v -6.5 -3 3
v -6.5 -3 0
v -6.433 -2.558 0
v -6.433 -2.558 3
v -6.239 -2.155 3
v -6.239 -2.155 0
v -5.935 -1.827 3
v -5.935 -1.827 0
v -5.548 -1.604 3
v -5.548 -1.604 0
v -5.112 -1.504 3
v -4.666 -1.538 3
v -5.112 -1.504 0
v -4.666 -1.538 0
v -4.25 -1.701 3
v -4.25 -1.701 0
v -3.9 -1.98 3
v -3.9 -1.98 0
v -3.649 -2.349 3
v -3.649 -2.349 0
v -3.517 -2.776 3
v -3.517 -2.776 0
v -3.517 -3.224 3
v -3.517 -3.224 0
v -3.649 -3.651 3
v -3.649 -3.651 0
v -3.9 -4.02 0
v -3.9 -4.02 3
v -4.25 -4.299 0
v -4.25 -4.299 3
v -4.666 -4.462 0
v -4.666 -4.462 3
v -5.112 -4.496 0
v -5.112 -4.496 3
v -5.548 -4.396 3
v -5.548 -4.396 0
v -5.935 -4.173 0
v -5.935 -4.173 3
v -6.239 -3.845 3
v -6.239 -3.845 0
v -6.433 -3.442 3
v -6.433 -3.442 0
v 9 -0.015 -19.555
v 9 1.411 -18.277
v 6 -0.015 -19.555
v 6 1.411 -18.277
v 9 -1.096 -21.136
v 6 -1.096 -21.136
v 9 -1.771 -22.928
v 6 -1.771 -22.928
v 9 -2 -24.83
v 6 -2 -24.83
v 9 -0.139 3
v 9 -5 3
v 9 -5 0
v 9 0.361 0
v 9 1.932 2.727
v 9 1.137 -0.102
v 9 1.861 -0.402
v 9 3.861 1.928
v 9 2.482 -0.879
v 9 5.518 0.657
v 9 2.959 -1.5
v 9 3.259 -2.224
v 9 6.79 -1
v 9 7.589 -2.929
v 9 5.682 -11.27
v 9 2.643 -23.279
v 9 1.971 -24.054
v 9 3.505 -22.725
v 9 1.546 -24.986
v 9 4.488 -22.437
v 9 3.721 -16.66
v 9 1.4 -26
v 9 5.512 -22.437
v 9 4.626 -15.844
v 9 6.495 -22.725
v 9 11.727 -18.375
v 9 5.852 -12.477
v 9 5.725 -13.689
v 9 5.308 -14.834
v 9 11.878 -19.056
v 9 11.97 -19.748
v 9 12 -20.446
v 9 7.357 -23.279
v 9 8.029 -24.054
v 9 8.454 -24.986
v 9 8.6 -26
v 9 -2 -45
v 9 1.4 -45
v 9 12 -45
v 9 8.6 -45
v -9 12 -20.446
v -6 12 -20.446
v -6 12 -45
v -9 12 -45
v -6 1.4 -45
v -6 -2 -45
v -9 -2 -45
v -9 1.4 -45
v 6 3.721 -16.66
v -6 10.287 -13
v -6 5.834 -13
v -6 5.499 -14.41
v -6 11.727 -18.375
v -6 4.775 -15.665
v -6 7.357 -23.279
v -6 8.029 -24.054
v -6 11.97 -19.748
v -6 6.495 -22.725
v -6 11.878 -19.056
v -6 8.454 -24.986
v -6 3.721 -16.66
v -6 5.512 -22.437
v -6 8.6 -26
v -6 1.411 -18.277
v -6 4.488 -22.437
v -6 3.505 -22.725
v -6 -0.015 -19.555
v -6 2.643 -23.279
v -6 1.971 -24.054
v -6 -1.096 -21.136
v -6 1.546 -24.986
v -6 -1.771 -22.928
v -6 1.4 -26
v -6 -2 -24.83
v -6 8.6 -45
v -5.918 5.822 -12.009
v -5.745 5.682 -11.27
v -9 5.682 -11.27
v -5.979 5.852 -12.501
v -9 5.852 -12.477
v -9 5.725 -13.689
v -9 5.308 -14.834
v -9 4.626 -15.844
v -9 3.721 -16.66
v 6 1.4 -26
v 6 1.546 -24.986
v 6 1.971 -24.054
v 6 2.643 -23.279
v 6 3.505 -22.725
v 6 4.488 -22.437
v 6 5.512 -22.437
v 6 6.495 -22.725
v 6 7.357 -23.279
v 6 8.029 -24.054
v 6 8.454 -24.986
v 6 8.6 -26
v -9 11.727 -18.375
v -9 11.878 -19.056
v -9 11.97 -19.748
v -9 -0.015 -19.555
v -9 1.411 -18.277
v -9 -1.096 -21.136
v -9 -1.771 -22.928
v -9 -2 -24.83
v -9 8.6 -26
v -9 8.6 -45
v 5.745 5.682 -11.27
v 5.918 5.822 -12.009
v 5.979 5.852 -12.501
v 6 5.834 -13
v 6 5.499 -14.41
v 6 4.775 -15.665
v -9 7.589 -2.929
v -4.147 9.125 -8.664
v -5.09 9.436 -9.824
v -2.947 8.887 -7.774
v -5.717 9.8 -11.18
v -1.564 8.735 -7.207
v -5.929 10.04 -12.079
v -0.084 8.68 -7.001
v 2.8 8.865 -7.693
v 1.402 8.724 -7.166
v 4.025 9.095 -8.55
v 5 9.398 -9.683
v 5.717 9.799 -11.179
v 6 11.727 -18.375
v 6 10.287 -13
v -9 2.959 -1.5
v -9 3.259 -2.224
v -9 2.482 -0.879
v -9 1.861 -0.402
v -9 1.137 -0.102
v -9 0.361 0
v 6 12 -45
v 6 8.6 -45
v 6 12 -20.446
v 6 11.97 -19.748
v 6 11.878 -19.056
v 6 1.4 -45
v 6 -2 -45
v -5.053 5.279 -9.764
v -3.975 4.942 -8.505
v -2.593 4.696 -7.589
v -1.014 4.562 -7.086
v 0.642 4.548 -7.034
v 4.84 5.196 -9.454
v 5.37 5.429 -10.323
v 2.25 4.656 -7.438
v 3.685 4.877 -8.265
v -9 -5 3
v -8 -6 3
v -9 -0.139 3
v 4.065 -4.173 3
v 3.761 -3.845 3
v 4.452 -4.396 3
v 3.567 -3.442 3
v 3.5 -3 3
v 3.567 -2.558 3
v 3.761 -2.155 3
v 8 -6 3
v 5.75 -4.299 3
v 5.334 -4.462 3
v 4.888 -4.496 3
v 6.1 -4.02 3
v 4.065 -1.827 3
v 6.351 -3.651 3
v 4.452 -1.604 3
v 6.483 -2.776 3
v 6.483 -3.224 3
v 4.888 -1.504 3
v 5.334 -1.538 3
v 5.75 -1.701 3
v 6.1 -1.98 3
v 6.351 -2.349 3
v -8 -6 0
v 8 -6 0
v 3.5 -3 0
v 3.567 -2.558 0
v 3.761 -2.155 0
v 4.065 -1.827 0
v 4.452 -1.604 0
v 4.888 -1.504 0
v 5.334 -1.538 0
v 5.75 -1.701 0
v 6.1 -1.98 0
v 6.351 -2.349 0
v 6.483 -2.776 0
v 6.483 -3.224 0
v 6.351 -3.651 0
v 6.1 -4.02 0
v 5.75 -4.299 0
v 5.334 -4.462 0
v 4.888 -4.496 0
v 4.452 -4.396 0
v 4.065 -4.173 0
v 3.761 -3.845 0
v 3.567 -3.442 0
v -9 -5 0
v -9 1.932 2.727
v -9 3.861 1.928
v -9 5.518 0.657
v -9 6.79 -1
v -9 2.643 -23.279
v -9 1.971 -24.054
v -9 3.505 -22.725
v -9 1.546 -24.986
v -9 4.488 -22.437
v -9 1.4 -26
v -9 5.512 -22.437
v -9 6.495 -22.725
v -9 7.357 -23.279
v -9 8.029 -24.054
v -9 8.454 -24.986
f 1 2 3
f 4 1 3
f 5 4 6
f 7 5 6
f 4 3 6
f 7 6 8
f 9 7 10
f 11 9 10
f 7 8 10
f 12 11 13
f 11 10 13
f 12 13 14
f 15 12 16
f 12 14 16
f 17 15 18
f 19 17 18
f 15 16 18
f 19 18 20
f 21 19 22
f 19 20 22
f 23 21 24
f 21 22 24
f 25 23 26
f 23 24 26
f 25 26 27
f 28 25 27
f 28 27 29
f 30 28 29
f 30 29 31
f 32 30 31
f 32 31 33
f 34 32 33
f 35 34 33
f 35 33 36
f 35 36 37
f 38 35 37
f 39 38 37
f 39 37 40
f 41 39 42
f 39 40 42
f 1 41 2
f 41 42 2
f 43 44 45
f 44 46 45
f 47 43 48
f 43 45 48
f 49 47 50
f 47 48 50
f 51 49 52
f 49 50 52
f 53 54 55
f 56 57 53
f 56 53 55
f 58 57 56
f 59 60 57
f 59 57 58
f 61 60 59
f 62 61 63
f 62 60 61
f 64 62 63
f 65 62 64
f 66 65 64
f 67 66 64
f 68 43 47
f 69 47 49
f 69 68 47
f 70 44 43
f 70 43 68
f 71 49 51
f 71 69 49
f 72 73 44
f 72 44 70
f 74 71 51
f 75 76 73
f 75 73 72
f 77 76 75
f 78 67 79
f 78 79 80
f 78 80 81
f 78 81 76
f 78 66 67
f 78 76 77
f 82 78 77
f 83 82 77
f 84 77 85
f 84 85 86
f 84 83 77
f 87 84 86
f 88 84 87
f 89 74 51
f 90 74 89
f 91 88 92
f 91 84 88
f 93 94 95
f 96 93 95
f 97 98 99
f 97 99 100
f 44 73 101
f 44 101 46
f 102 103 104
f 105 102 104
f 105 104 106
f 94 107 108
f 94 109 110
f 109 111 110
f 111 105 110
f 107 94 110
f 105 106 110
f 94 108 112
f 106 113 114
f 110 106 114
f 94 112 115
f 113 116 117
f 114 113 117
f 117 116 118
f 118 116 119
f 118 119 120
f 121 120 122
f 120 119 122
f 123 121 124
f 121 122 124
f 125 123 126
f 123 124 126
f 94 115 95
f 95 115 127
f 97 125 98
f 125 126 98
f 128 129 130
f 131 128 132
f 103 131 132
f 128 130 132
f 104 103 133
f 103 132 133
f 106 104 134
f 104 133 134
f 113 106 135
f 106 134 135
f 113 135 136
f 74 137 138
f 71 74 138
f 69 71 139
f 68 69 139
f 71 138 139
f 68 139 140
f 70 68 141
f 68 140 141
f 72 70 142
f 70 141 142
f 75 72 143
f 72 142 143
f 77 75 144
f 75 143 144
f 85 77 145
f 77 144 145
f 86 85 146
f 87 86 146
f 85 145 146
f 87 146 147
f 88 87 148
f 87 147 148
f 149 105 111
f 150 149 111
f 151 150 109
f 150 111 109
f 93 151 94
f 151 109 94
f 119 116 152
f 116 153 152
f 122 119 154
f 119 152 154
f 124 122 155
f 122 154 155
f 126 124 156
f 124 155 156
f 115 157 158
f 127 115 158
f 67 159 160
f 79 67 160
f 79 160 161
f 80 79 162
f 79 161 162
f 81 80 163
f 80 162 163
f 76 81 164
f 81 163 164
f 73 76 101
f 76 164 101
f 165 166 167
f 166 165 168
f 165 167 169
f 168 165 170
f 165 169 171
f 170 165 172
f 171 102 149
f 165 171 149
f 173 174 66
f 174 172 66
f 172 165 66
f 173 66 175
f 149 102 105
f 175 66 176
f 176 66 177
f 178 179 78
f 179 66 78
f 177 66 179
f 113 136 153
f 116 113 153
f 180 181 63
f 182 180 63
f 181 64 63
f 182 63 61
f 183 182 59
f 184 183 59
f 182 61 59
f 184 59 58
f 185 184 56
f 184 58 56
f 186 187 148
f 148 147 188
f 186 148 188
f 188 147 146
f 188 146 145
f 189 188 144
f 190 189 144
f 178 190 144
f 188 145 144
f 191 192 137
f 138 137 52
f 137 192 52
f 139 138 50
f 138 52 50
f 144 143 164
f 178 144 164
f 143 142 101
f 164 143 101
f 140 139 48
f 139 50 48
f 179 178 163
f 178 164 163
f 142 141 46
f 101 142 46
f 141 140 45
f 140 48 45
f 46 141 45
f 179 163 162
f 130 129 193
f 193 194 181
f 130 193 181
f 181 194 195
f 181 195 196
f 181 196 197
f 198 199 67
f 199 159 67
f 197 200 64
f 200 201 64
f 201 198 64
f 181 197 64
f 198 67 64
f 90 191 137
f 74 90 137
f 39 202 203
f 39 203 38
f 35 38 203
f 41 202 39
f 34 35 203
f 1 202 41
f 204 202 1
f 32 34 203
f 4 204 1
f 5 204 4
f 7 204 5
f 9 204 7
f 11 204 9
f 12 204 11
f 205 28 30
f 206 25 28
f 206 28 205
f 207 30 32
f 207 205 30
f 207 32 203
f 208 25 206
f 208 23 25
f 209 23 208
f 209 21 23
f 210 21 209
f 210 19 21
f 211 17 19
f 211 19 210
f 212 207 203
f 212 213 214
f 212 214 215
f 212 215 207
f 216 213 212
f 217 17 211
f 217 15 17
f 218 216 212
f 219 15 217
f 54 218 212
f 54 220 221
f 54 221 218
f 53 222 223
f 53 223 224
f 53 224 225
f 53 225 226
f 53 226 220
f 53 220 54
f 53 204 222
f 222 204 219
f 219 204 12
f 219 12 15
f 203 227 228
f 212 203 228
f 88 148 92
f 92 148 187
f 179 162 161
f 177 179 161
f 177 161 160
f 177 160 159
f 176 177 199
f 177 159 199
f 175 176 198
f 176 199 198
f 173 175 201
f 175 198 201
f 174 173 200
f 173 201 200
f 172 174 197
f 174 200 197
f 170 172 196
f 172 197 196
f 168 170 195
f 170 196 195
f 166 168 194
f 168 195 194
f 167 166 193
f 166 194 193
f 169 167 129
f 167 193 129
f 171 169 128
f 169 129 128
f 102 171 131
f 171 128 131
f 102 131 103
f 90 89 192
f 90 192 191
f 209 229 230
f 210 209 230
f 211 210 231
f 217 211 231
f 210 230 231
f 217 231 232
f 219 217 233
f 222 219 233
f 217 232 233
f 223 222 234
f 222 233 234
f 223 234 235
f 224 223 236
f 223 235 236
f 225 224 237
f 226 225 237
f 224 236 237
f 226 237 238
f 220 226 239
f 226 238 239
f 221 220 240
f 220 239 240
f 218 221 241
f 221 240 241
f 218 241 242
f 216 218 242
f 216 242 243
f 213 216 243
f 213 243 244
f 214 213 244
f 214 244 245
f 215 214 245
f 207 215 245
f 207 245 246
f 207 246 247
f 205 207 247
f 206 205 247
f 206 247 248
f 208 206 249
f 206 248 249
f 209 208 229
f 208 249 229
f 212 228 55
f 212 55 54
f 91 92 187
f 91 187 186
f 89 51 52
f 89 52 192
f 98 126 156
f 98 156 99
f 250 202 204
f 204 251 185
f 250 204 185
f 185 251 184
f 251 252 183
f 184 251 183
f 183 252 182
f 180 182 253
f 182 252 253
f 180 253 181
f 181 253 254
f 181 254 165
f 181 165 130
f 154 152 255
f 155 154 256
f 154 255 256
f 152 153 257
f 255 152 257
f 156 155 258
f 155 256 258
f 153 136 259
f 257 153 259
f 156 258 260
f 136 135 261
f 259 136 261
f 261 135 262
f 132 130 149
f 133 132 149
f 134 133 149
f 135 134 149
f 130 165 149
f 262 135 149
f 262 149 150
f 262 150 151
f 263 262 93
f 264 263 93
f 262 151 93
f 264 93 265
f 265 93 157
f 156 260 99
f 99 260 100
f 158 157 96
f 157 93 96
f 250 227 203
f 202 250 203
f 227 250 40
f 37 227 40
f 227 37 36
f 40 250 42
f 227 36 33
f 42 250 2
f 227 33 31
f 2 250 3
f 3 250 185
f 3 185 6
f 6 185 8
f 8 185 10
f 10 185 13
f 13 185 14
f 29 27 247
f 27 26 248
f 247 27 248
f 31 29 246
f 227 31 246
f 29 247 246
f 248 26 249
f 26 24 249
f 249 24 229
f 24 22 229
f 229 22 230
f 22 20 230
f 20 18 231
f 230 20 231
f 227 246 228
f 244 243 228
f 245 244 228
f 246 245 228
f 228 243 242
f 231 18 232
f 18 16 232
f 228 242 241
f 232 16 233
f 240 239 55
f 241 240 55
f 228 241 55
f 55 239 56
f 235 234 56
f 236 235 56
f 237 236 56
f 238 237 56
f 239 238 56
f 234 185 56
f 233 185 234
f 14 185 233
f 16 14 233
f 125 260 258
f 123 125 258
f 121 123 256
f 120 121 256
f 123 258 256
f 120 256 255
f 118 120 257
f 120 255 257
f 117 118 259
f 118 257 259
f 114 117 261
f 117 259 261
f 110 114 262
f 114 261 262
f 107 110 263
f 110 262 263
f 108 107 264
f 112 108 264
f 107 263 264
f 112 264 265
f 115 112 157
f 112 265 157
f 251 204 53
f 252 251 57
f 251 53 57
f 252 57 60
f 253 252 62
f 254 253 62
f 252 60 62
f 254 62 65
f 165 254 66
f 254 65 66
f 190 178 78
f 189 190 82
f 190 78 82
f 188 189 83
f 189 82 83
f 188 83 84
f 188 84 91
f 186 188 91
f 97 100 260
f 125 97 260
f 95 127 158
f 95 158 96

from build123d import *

# Parameters (mm, degrees)
SKETCH_1_W          = 18
SKETCH_1_H          = 12
EXTRUDE_1_DEPTH     = 3
EXTRUDE_2_DEPTH     = 9
EXTRUDE1_DEPTH      = 18
SKETCH_5_R          = 1.5
CUT_EXTRUDE_5_DEPTH = 3
CHAMFER_1_SIZE      = 1
FILLET1_R           = 8
EXTRUDE6_REACH      = 51.295
EXTRUDE7_START      = -18
EXTRUDE7_DEPTH      = 18
FILLET5_R           = 3
FILLET6_R           = 5
FILLET7_R           = 8


with BuildPart() as part:
    # 草图1 → 拉伸1 (new body)
    with BuildSketch(Plane.XY):
        Rectangle(SKETCH_1_W, SKETCH_1_H)
    extrude(amount=EXTRUDE_1_DEPTH)

    # 草图2 → 拉伸2 (add, symmetric)
    with BuildSketch(Plane(origin=(0, 0, 0), x_dir=(0, 0, -1), z_dir=(1, 0, 0))):
        Polygon((19.392304845, 12), (45, 12), (45, 8.2), (20.665324997, 8.2), (0, 2.662742856), (-3, 6), align=None)
    extrude(amount=EXTRUDE_2_DEPTH, both=True)

    # Sketch2 → Extrude1 (add)
    with BuildSketch(Plane(origin=(9, 0, 0), x_dir=(0, 0, -1), z_dir=(1, 0, 0))):
        Polygon((45, 8.2), (20.665324997, 8.2), (14.65151871, 6.588605462), (20.665324997, -2), (45, -2), align=None)
    extrude(amount=-EXTRUDE1_DEPTH)

    # 草图5 → 拉伸5 (cut)
    with BuildSketch(Plane(origin=(0, 0, 0), x_dir=(-1, 0, 0), z_dir=(0, 0, -1))):
        with Locations((-5, -3)):
            Circle(SKETCH_5_R)
        with Locations((5, -3)):
            Circle(SKETCH_5_R)
    extrude(amount=-CUT_EXTRUDE_5_DEPTH, mode=Mode.SUBTRACT)

    # 倒角1
    chamfer_1_edges = [part.edges().sort_by_distance(p)[0] for p in [
        (9, -6, 1.5),
        (-9, -6, 1.5),
    ]]
    chamfer(chamfer_1_edges, length=CHAMFER_1_SIZE)

    # Fillet1
    fillet1_edges = [part.edges().sort_by_distance(p)[0] for p in [
        (0, 6, 3),
        (0, 12, -19.392304845),
    ]]
    fillet(fillet1_edges, radius=FILLET1_R)

    # Extrude6: up to this face of the body (flat: up to its plane)
    extrude6_end = Plane(part.part.faces().sort_by_distance((0, 12, -32.722762413))[0])
    # Sketch3 → Extrude6 (cut, up to the picked face)
    with BuildSketch(Plane.XZ.offset(6), mode=Mode.PRIVATE) as extrude6_sk1:
        with BuildLine():
            Line((-6, -45), (6, -45))
            Line((6, -45), (6, -13))
            ThreePointArc((6, -13), (0, -7), (-6, -13))
            Line((-6, -13), (-6, -45))
        make_face()
    extrude6_tool1 = split(extrude(extrude6_sk1.sketch, amount=-EXTRUDE6_REACH, mode=Mode.PRIVATE), bisect_by=extrude6_end, keep=Keep.BOTH, mode=Mode.PRIVATE)
    add(extrude6_tool1.solids().sort_by(Axis((0, -6, -26.619381), (0, 1, 0)))[0], mode=Mode.SUBTRACT)

    # Sketch4 → Extrude7 (cut)
    with BuildSketch(Plane(origin=(9, 0, 0), x_dir=(0, 0, -1), z_dir=(1, 0, 0)).offset(EXTRUDE7_START)):
        with BuildLine():
            Line((26, 8.6), (45, 8.6))
            Line((45, 8.6), (45, 1.4))
            Line((45, 1.4), (26, 1.4))
            ThreePointArc((26, 1.4), (22.4, 5), (26, 8.6))
        make_face()
    extrude(amount=EXTRUDE7_DEPTH, mode=Mode.SUBTRACT)

    # Fillet5
    fillet5_edges = [part.edges().sort_by_distance(p)[0] for p in [
        (0, 2.662742856, 0),
    ]]
    fillet(fillet5_edges, radius=FILLET5_R)

    # Fillet6
    fillet6_edges = [part.edges().sort_by_distance(p)[0] for p in [
        (-7.5, 6.588605462, -14.65151871),
        (7.5, 6.588605462, -14.65151871),
    ]]
    fillet(fillet6_edges, radius=FILLET6_R)

    # Fillet7
    fillet7_edges = [part.edges().sort_by_distance(p)[0] for p in [
        (-7.5, -2, -20.665324997),
        (7.5, -2, -20.665324997),
    ]]
    fillet(fillet7_edges, radius=FILLET7_R)


solid = part.part
